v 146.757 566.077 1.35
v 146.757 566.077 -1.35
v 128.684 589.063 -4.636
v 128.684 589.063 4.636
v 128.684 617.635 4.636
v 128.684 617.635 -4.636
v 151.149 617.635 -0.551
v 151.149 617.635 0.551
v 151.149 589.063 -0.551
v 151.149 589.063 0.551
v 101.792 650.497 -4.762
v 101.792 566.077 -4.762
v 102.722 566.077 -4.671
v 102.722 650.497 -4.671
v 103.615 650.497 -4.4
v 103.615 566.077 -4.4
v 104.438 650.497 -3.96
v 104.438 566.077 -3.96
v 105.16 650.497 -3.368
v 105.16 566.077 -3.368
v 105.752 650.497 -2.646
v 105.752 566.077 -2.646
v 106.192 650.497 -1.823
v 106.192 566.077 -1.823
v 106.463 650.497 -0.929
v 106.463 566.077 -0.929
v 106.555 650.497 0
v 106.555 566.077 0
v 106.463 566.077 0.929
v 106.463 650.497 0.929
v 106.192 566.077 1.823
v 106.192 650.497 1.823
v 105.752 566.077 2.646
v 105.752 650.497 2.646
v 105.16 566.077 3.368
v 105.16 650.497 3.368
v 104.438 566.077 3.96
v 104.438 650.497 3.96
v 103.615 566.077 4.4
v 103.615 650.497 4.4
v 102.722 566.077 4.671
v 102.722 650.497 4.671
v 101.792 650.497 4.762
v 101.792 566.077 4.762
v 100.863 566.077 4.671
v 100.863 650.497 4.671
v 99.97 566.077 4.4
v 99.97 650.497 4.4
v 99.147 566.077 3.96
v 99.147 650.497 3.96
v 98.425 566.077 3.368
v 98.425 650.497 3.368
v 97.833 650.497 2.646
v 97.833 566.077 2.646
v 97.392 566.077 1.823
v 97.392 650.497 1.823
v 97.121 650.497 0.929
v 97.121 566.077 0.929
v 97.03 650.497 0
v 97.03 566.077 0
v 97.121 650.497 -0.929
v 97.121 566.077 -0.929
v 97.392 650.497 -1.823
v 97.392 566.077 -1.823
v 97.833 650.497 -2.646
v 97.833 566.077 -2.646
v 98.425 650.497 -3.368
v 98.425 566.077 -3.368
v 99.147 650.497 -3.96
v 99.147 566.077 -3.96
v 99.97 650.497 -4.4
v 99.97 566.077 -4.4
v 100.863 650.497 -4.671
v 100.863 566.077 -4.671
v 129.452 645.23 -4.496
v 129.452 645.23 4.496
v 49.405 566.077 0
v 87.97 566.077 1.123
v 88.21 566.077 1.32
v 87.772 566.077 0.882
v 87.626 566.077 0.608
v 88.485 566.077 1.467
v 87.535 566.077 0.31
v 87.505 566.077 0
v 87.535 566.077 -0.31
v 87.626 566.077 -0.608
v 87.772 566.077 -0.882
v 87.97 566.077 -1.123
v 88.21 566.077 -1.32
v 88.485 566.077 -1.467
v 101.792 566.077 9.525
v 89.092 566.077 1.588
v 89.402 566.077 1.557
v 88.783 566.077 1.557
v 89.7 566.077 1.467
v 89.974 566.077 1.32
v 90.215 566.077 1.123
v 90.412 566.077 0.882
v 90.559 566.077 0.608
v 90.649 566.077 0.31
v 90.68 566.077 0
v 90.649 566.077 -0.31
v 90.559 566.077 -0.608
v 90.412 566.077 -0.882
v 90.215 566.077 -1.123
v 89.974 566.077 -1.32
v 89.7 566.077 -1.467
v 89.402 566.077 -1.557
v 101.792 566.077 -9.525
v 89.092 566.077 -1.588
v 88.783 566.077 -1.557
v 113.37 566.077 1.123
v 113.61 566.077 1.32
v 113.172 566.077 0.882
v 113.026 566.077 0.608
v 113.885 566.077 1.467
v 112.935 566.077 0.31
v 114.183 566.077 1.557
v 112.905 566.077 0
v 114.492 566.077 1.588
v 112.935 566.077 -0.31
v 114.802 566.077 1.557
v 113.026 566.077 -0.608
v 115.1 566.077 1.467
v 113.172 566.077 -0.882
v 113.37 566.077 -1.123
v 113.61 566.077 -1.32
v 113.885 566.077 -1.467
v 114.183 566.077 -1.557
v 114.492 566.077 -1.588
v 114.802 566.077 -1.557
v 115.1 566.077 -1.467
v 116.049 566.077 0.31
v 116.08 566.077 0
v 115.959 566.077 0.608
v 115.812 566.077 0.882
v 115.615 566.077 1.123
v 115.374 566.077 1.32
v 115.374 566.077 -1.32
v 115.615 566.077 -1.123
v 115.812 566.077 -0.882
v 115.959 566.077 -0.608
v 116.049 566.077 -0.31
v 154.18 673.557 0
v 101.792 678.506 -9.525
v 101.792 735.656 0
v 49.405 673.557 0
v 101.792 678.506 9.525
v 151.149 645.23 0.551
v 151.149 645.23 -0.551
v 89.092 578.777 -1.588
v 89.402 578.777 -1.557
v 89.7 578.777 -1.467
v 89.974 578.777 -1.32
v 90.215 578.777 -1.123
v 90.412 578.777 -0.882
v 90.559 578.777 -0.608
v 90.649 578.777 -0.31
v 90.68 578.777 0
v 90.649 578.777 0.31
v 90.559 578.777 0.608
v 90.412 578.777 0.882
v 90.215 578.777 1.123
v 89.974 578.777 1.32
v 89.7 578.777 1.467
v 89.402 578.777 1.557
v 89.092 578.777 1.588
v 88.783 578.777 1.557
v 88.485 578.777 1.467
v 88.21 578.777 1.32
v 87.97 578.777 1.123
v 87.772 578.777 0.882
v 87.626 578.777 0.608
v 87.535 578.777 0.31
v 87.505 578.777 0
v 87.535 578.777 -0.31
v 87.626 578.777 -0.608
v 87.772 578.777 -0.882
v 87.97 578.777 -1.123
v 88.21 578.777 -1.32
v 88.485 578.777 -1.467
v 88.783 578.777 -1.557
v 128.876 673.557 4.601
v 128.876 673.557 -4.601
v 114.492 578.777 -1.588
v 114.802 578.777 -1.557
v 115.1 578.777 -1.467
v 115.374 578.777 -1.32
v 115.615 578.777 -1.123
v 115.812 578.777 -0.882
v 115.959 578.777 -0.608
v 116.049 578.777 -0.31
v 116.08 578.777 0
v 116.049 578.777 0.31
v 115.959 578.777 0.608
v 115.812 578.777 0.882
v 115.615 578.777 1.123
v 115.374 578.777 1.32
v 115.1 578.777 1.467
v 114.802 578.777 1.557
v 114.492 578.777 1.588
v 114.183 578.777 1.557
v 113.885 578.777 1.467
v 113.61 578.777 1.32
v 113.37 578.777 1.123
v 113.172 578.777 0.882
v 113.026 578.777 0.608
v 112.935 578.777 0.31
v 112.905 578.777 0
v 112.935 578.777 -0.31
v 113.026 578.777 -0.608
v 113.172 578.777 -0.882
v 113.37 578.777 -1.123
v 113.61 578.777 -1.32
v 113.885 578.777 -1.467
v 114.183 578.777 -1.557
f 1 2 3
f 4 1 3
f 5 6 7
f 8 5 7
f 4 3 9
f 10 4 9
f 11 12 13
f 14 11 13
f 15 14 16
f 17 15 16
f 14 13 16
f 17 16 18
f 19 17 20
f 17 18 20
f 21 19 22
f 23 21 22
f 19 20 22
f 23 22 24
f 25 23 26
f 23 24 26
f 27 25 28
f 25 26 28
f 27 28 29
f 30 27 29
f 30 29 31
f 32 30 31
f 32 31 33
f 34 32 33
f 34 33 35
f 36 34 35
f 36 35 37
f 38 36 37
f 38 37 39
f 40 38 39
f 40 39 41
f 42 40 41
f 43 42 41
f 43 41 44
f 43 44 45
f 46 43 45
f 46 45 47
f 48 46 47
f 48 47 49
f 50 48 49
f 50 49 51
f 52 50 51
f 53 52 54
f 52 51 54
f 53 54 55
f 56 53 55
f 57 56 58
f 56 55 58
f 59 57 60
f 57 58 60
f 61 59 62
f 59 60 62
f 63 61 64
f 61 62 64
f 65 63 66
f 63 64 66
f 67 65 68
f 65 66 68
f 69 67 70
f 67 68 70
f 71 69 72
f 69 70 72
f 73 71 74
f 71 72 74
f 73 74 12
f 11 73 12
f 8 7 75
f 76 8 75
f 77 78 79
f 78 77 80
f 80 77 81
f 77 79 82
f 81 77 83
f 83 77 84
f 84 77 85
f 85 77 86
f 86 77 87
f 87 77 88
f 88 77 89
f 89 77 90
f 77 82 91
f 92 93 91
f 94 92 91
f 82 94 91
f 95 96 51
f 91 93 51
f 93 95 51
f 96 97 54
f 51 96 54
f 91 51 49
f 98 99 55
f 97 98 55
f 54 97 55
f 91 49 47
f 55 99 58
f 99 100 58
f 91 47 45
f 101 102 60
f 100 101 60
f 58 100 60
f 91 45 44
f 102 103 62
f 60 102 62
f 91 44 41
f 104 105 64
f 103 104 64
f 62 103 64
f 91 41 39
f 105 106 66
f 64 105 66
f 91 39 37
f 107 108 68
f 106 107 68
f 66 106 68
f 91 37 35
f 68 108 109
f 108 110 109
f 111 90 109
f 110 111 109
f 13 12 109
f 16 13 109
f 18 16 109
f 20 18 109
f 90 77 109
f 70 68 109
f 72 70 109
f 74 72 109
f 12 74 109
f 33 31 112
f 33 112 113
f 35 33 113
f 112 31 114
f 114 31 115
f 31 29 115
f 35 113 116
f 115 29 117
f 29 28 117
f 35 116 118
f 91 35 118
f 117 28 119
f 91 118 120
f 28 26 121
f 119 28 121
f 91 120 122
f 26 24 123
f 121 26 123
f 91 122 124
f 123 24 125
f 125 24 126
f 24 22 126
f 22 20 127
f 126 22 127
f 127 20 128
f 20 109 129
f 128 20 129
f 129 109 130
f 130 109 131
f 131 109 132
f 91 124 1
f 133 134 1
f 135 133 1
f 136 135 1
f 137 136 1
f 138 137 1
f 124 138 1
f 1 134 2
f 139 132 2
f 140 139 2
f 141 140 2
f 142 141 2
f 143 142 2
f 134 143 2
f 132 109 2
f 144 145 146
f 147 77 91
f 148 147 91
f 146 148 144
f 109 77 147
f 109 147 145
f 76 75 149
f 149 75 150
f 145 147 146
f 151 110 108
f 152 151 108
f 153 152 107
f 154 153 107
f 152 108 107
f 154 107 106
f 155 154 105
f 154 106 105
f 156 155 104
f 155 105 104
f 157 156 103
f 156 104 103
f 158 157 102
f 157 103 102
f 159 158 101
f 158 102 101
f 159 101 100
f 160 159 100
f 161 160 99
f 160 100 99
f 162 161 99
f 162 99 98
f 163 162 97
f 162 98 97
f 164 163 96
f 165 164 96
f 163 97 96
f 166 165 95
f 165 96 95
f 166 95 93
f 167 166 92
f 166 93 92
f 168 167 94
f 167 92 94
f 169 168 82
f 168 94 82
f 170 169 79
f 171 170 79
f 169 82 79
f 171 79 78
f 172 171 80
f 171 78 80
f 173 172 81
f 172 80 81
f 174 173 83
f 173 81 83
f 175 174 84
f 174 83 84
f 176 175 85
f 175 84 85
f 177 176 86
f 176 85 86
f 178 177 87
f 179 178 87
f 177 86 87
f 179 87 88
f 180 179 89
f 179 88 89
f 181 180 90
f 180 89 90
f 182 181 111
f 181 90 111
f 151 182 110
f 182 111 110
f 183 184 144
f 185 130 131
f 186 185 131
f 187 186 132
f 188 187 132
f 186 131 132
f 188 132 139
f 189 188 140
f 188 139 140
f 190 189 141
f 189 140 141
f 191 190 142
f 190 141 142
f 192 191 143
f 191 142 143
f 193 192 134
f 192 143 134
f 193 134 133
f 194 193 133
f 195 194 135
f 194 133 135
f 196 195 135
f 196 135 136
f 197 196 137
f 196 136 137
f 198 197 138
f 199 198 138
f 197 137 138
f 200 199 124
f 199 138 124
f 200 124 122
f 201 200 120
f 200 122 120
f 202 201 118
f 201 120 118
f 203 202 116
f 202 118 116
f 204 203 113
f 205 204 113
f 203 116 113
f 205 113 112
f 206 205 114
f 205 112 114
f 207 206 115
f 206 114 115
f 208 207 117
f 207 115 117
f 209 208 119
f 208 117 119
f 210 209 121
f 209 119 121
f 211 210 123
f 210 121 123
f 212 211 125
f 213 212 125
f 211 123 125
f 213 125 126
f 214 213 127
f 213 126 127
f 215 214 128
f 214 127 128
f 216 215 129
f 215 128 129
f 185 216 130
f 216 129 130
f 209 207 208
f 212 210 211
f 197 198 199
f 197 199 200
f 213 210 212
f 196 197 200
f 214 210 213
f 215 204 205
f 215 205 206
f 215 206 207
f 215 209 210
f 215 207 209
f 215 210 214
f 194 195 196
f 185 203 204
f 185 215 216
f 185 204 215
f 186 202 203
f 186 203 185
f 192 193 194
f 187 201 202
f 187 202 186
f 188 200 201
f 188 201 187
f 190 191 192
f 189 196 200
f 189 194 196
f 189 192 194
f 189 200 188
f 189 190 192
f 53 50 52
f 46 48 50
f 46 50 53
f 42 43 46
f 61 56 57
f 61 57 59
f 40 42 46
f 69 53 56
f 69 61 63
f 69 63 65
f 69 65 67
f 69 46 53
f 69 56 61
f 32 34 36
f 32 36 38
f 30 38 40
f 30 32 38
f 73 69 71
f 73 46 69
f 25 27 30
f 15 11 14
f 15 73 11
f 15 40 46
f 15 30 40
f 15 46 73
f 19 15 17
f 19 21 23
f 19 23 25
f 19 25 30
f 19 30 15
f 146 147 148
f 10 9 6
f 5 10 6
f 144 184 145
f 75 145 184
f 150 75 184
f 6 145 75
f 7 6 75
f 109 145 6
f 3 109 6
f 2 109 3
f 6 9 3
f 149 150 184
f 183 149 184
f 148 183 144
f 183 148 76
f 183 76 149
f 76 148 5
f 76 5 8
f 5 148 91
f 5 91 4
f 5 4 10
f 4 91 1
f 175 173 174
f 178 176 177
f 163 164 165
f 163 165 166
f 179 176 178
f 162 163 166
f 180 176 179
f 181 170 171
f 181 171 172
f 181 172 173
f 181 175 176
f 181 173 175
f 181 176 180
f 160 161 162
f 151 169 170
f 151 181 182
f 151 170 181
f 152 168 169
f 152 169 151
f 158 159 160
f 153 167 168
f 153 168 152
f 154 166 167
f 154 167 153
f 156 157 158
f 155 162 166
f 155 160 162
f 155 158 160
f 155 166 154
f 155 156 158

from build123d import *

# Parameters (mm, degrees)
BOSS_EXTRUDE1_DEPTH      = 9.525
BOSS_EXTRUDE1_DEPTH_BACK = 9.525
CUT_EXTRUDE1_DEPTH       = 373.680910299
CUT_EXTRUDE2_DEPTH       = 373.680910299
SKETCH5_W                = 97.518379051
SKETCH5_H                = 136.419580789
CUT_EXTRUDE3_DEPTH       = 739.741184154
SKETCH6_W                = 75.100700845
SKETCH6_H                = 154.277977479
CUT_EXTRUDE4_DEPTH       = 748.678846608
SKETCH7_R                = 4.7625
CUT_EXTRUDE5_DEPTH       = 254
CUT_EXTRUDE6_DEPTH       = 752.699804454
CUT_EXTRUDE6_DEPTH_BACK  = 752.699804454
SKETCH11_R               = 1.5875
CUT_EXTRUDE9_DEPTH       = 12.7


with BuildPart() as part:
    # Sketch1 → Boss-Extrude1 (new, two sides: drawn at the far end of the back side and taken through both)
    with BuildSketch(Plane.XY.offset(-BOSS_EXTRUDE1_DEPTH_BACK)):
        Polygon((101.792411443, 735.656458749), (49.404911443, 673.557276224), (49.404911443, 396.497366015), (154.179911443, 396.497366015), (154.179911443, 556.636391043), (128.683999881, 589.063224066), (151.148766449, 589.063224066), (128.683999881, 617.634912224), (151.148766449, 617.634912224), (129.452026088, 645.229790529), (151.148766449, 645.229790529), (128.876006433, 673.557276224), (154.179911443, 673.557276224), align=None)
    extrude(amount=BOSS_EXTRUDE1_DEPTH + BOSS_EXTRUDE1_DEPTH_BACK)

    # Sketch2 → Cut-Extrude1 (cut, through all)
    with BuildSketch(Plane(origin=(0, 396.497366015, 0), x_dir=(-1, 0, 0), z_dir=(0, -1, 0))):
        Polygon((-49.404911443, 0), (-101.792411443, -9.525), (-154.179911443, 0), (-159.65732669, 0), (-159.65732669, -13.649148588), (-44.158493861, -13.649148588), (-44.158493861, 0), align=None)
    extrude(amount=-CUT_EXTRUDE1_DEPTH, mode=Mode.SUBTRACT)

    # Sketch3 → Cut-Extrude2 (cut, through all)
    with BuildSketch(Plane.XZ.offset(-396.497366015)):
        Polygon((49.404911443, 0), (101.792411443, -9.525), (154.179911443, 0), (159.580570647, 0), (159.580570647, -14.500746269), (43.682013433, -14.500746269), (43.682013433, 0), align=None)
    extrude(amount=-CUT_EXTRUDE2_DEPTH, mode=Mode.SUBTRACT)

    # Sketch5 → Cut-Extrude3 (cut, through all)
    with BuildSketch(Plane(origin=(26.430459561, 22.297003663, 133.782021979), x_dir=(0.9815360247212257, -0.031445805879602766, -0.1886748352776165), z_dir=(0.1912773697394791, 0.16136352846789567, 0.9681811708073739))):
        with Locations((89.248369642, 700.742830845)):
            Rectangle(SKETCH5_W, SKETCH5_H)
    cut_extrude3 = extrude(amount=CUT_EXTRUDE3_DEPTH, mode=Mode.SUBTRACT)

    # Sketch6 → Cut-Extrude4 (cut, through all)
    with BuildSketch(Plane(origin=(-18.981895096, 16.01331916, 96.079914958), x_dir=(0.9815360247212258, 0.03144580587960229, 0.18867483527761636), z_dir=(-0.19127736973947887, 0.1613635284678934, 0.9681811708073744))):
        with Locations((98.873573013, 697.792784398)):
            Rectangle(SKETCH6_W, SKETCH6_H)
    cut_extrude4 = extrude(amount=CUT_EXTRUDE4_DEPTH, mode=Mode.SUBTRACT)

    # Mirror1: Cut-Extrude3, Cut-Extrude4 across plane
    add(cut_extrude3.mirror(Plane.XY), mode=Mode.SUBTRACT)
    add(cut_extrude4.mirror(Plane.XY), mode=Mode.SUBTRACT)

    # Sketch7 → Cut-Extrude5 (cut)
    with BuildSketch(Plane.XZ.offset(-396.497366015)):
        with Locations((101.792411443, 0)):
            Circle(SKETCH7_R)
    extrude(amount=-CUT_EXTRUDE5_DEPTH, mode=Mode.SUBTRACT)

    # Sketch8 → Cut-Extrude6 (cut, two sides: drawn at the far end of the back side and taken through both)
    with BuildSketch(Plane.XY.offset(-CUT_EXTRUDE6_DEPTH_BACK)):
        Polygon((101.792411443, 566.076912382), (-21.644649604, 566.076912382), (-21.644649604, 347.628500893), (201.352960681, 347.628500893), (201.352960681, 566.076912382), align=None)
    extrude(amount=CUT_EXTRUDE6_DEPTH + CUT_EXTRUDE6_DEPTH_BACK, mode=Mode.SUBTRACT)

    # Sketch11 → Cut-Extrude9 (cut)
    with BuildSketch(Plane.XZ.offset(-566.076912382)):
        with Locations((89.092411443, 0)):
            Circle(SKETCH11_R)
        with Locations((114.492411443, 0)):
            Circle(SKETCH11_R)
    extrude(amount=-CUT_EXTRUDE9_DEPTH, mode=Mode.SUBTRACT)


solid = part.part
